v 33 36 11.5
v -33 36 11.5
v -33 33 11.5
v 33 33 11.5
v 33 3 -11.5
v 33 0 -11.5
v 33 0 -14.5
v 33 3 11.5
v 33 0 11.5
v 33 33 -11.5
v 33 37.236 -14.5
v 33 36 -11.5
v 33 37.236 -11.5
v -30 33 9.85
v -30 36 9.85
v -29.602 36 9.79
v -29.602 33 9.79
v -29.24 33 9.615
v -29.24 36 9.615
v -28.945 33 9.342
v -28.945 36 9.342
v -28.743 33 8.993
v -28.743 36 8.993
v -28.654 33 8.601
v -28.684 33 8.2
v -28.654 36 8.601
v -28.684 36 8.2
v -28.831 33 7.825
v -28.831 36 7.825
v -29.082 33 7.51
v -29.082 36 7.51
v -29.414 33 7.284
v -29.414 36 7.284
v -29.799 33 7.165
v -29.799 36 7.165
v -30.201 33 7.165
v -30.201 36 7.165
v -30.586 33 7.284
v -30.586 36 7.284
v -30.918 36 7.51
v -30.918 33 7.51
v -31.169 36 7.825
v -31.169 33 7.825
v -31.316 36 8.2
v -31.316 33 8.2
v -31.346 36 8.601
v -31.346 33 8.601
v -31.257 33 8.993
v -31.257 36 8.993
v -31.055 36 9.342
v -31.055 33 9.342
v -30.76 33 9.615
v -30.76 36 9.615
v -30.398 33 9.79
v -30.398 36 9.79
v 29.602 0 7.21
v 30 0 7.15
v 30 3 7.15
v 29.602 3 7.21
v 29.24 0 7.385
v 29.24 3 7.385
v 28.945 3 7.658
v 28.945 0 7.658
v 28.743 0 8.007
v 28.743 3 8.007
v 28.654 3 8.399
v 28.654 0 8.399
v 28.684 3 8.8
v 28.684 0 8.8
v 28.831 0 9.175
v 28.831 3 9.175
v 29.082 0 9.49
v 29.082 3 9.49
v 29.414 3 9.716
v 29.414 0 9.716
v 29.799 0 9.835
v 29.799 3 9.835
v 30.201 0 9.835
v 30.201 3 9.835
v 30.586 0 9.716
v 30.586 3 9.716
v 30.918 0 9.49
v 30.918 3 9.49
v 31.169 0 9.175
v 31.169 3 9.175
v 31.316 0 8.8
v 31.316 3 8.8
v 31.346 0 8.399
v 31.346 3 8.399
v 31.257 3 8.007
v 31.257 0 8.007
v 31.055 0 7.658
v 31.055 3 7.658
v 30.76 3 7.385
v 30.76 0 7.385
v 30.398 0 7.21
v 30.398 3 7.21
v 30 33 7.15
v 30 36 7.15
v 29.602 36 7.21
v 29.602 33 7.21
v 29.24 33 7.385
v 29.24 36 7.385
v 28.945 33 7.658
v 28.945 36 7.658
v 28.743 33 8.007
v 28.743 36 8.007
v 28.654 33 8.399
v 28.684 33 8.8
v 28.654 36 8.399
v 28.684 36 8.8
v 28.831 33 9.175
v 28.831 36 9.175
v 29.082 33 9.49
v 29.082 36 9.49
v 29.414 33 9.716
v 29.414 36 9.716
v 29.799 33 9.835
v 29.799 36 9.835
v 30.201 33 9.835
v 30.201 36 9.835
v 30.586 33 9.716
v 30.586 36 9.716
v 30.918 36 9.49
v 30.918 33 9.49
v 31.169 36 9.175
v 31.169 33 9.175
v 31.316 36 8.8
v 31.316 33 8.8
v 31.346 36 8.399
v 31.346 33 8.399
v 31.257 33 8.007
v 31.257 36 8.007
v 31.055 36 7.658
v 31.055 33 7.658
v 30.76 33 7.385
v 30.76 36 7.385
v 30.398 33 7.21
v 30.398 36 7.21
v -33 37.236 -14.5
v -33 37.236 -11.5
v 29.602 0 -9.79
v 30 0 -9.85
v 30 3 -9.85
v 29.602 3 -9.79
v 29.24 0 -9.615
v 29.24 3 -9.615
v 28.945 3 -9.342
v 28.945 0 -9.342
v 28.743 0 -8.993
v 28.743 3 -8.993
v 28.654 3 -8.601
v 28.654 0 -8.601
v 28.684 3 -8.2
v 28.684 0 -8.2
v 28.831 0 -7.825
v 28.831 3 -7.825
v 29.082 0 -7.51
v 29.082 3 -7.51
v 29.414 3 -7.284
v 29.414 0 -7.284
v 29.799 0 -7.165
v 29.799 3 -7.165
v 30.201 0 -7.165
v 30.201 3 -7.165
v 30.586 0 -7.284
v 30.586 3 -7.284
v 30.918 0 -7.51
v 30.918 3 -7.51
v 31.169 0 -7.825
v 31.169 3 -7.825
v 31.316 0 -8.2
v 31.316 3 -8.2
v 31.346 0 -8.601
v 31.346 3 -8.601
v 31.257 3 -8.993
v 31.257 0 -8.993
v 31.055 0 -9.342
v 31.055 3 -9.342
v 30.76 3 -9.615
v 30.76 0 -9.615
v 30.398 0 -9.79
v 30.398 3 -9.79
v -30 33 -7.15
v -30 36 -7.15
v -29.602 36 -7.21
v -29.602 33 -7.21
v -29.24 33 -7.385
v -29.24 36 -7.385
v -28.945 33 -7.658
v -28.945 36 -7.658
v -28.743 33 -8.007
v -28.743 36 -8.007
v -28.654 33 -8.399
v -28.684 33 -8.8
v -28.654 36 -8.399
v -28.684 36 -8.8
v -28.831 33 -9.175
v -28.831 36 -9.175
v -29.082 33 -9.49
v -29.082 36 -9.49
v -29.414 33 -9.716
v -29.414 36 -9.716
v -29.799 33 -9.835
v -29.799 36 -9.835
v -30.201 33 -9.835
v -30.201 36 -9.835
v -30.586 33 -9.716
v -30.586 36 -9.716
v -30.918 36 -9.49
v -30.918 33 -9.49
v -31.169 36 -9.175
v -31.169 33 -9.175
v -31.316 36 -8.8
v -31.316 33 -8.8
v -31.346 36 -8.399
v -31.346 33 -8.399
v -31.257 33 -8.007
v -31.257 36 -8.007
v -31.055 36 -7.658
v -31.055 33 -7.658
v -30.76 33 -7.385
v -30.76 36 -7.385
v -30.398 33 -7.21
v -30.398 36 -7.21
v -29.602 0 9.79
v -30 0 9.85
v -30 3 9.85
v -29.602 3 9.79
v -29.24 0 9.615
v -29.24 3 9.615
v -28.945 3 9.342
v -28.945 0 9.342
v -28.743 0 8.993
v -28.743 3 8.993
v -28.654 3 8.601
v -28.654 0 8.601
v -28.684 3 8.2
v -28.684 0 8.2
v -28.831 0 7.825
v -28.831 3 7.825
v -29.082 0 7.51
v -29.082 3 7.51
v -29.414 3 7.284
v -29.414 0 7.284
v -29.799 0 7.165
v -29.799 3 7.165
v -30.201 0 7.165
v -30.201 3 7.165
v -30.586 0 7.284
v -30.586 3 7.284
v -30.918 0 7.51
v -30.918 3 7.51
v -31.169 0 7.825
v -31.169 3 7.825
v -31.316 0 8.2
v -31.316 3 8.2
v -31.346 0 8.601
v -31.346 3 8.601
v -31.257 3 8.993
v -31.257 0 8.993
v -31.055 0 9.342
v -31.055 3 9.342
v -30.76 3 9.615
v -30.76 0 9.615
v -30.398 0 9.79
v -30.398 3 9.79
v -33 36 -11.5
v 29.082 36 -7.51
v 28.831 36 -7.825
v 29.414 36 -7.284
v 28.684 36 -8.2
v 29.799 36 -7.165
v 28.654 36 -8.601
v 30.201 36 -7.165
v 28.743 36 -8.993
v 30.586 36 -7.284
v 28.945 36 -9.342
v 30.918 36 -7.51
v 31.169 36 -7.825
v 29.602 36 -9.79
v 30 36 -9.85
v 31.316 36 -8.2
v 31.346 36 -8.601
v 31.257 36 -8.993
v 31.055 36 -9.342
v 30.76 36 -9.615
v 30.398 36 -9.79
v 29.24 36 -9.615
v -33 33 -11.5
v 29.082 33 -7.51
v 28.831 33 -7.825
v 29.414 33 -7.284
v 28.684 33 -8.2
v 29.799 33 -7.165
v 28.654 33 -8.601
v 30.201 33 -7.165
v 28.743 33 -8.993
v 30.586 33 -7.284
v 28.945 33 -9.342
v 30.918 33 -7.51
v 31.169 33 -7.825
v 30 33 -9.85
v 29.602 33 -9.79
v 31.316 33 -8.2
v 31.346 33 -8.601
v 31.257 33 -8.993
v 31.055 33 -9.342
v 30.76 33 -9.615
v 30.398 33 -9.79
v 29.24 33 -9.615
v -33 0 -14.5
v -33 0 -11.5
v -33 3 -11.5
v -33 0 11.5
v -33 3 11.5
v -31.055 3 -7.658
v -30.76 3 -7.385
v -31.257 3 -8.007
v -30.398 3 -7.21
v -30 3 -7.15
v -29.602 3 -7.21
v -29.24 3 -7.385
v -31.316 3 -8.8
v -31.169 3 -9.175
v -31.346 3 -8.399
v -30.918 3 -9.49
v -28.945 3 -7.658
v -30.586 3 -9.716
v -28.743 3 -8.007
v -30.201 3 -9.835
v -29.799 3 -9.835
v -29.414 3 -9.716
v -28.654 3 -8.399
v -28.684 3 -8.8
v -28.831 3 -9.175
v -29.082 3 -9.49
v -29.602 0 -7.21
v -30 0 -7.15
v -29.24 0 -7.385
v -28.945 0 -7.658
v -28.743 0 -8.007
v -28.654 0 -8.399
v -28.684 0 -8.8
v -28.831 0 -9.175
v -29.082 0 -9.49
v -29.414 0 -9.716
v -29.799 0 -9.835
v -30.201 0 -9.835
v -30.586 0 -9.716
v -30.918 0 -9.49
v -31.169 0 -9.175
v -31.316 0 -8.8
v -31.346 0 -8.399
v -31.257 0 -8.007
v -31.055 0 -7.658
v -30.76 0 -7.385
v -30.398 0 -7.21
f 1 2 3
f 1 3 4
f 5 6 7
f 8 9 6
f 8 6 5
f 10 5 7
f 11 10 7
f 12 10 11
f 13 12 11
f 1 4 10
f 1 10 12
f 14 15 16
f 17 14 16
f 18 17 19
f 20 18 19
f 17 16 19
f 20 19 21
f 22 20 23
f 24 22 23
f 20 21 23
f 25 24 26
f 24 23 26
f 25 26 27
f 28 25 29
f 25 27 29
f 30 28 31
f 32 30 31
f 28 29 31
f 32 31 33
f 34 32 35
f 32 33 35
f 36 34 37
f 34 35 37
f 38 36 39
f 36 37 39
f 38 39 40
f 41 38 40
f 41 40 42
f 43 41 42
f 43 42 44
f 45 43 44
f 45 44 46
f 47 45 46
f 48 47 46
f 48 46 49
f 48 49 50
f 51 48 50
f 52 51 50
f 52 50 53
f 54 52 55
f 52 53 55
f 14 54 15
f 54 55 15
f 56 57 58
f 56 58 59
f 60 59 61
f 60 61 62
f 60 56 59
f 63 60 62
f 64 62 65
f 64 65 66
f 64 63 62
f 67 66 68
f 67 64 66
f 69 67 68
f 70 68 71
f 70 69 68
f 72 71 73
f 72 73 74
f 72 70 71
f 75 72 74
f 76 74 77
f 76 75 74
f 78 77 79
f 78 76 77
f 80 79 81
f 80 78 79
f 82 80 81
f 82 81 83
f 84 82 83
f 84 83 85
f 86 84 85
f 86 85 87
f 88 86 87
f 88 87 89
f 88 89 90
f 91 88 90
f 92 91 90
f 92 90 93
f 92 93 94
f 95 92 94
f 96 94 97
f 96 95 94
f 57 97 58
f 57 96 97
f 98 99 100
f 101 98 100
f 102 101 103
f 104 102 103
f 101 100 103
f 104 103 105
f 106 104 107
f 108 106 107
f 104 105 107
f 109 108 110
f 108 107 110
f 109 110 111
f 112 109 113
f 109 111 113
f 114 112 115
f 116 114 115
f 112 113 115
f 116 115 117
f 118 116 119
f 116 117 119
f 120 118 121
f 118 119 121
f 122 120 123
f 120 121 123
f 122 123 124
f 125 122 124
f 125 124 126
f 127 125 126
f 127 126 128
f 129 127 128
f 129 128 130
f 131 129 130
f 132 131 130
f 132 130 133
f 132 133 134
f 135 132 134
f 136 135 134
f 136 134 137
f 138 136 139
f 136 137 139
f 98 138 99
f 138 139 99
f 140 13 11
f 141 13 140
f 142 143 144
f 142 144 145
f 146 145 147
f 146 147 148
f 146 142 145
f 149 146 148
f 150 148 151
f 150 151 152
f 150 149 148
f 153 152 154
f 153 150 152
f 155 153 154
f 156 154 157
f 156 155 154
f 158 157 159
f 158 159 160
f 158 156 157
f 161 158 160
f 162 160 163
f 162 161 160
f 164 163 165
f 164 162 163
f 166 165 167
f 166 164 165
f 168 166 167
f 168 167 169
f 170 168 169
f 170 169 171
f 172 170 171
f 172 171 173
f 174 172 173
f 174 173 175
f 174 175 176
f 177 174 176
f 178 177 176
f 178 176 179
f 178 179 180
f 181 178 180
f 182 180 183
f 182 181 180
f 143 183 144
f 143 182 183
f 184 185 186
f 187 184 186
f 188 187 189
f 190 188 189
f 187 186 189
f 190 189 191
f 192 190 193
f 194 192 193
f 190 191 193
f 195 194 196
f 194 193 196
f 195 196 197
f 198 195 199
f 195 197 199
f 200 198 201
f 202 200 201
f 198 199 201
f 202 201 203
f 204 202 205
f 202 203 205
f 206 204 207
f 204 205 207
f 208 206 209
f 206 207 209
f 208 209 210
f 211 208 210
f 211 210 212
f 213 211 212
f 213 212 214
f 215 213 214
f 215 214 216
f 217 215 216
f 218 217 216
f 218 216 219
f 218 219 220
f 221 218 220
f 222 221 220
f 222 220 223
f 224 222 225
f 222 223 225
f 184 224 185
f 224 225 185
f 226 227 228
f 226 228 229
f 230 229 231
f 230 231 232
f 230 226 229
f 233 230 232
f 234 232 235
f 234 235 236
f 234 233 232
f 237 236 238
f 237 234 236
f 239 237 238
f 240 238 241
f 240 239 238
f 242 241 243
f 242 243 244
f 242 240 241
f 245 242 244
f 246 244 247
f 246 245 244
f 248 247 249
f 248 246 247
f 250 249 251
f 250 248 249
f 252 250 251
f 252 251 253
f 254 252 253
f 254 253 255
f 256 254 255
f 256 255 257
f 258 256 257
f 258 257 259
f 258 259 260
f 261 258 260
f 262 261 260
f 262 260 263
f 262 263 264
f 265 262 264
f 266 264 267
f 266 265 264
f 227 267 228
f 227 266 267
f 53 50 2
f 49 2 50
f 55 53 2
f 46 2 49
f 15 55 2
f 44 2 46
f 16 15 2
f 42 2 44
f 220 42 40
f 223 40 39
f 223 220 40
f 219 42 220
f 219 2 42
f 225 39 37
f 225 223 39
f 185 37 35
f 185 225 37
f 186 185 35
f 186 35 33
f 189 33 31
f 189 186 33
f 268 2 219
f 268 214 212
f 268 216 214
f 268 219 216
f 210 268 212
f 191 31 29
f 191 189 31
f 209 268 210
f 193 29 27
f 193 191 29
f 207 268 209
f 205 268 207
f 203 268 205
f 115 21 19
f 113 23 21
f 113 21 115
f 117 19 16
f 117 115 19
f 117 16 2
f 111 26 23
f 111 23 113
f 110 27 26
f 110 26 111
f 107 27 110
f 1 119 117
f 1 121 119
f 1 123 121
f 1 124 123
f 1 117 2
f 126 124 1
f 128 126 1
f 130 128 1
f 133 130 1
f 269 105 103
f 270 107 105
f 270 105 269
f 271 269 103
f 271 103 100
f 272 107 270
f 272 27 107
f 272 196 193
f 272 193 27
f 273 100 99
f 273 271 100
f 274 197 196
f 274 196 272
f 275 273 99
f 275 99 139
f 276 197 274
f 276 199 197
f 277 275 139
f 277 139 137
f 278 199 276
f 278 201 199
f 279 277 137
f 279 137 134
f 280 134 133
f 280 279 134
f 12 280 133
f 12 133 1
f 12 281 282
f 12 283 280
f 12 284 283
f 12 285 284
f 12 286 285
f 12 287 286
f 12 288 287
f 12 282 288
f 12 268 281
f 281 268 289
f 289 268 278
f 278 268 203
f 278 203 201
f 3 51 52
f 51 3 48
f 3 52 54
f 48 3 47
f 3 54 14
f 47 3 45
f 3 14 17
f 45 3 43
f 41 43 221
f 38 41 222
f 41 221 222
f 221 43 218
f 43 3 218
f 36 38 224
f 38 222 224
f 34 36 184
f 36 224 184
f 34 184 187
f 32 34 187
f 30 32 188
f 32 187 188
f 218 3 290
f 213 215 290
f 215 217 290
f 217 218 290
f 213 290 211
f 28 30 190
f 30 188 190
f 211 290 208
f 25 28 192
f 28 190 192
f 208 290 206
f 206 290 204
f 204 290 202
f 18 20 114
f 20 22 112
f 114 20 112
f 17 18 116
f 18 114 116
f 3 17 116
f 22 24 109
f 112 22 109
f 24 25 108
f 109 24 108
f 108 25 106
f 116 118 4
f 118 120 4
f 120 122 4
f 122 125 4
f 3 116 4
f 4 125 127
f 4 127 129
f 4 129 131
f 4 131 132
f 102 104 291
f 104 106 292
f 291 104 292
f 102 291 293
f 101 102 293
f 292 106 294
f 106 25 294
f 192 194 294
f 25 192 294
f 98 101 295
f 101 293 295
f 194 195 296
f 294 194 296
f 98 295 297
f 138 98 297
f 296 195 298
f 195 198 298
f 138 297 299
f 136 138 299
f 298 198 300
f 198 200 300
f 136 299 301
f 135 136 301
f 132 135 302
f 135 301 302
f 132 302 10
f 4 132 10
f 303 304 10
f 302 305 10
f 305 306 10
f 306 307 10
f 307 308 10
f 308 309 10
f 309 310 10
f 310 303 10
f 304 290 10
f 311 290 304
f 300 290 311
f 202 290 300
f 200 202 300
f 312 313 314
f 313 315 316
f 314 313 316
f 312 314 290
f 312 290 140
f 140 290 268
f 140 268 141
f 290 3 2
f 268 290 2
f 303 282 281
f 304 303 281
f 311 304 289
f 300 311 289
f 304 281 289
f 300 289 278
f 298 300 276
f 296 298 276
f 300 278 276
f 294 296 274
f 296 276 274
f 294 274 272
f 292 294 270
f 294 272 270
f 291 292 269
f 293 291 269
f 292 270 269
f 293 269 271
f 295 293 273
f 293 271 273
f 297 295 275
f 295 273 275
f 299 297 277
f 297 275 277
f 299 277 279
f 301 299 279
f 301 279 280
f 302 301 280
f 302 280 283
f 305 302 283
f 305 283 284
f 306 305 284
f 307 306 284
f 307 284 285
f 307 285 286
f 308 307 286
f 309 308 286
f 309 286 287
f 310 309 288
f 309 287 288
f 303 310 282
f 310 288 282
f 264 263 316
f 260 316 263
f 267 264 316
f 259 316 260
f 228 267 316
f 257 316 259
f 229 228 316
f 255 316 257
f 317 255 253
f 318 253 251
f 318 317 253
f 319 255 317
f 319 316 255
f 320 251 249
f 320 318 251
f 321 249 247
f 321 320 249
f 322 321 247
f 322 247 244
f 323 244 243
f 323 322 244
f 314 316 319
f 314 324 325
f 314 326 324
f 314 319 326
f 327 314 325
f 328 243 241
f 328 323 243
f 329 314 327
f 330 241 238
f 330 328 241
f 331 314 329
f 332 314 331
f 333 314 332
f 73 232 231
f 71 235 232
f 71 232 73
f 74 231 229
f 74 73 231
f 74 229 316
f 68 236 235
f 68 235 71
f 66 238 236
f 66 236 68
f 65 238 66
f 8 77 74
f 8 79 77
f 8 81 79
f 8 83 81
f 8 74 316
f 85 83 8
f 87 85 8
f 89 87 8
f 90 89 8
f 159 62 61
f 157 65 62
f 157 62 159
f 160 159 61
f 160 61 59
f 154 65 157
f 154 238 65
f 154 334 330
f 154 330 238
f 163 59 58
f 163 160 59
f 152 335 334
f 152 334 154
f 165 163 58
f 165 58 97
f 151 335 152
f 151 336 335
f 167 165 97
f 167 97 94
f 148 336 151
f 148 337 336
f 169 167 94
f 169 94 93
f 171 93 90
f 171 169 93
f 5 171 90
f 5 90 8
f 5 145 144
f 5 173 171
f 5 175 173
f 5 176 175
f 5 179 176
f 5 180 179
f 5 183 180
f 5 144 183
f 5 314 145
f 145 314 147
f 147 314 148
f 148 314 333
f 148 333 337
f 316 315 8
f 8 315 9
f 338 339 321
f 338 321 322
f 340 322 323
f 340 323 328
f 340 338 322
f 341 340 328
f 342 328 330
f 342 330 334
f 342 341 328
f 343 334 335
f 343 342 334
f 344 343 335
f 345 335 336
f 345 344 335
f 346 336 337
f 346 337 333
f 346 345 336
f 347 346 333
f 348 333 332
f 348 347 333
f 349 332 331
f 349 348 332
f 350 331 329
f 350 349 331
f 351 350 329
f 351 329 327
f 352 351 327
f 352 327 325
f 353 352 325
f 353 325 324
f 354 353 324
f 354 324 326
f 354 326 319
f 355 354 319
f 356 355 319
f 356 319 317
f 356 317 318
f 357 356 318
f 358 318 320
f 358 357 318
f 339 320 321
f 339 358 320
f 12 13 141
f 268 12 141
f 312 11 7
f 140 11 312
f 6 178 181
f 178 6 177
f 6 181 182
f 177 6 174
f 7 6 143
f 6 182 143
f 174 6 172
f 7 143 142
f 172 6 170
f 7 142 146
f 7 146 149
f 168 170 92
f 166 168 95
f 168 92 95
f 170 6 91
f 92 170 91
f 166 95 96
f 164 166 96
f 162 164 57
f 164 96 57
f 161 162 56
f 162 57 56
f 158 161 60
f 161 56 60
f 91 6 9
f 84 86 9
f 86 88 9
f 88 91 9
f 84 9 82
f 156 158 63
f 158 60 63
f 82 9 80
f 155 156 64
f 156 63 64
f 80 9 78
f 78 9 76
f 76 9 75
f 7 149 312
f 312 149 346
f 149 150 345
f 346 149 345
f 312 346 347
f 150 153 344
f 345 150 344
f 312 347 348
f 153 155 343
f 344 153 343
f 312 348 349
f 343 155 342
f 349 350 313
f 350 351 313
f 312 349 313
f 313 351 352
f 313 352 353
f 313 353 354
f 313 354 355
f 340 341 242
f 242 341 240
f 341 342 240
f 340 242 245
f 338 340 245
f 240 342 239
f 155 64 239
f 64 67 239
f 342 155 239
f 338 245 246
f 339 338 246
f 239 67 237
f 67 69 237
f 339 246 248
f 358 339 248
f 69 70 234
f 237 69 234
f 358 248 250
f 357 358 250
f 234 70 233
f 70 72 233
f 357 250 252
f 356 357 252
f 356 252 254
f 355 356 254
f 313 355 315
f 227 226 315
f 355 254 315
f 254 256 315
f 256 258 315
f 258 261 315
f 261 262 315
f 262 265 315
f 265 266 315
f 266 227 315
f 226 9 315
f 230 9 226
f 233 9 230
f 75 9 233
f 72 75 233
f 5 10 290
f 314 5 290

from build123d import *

# Parameters (mm, degrees)
SKETCH1_W           = 66
SKETCH1_H           = 23
SKETCH1_R           = 1.35
BOSS_EXTRUDE1_DEPTH = 3
SKETCH2_W           = 66
SKETCH2_H           = 37.236421537
BOSS_EXTRUDE2_DEPTH = 3


with BuildPart() as part:
    # Sketch1 → Boss-Extrude1 (new body)
    with BuildSketch(Plane(origin=(0, 0, 0), x_dir=(1, 0, 0), z_dir=(0, 1, 0))):
        Rectangle(SKETCH1_W, SKETCH1_H)
        with Locations(Location((-30, -8.5, 0), (0, 0, 270))):
            Circle(SKETCH1_R, mode=Mode.SUBTRACT)
        with Locations(Location((-30, 8.5, 0), (0, 0, 270))):
            Circle(SKETCH1_R, mode=Mode.SUBTRACT)
        with Locations(Location((30, -8.5, 0), (0, 0, 90))):
            Circle(SKETCH1_R, mode=Mode.SUBTRACT)
        with Locations(Location((30, 8.5, 0), (0, 0, 90))):
            Circle(SKETCH1_R, mode=Mode.SUBTRACT)
    boss_extrude1 = extrude(amount=BOSS_EXTRUDE1_DEPTH)

    # Sketch2 → Boss-Extrude2 (add)
    with BuildSketch(Plane(origin=(0, 0, -11.5), x_dir=(-1, 0, 0), z_dir=(0, 0, -1))):
        with Locations((0, 18.618210769)):
            Rectangle(SKETCH2_W, SKETCH2_H)
    extrude(amount=BOSS_EXTRUDE2_DEPTH)

    # Mirror2: Boss-Extrude1 across plane
    add(boss_extrude1.mirror(Plane.ZX.offset(18)))


solid = part.part
